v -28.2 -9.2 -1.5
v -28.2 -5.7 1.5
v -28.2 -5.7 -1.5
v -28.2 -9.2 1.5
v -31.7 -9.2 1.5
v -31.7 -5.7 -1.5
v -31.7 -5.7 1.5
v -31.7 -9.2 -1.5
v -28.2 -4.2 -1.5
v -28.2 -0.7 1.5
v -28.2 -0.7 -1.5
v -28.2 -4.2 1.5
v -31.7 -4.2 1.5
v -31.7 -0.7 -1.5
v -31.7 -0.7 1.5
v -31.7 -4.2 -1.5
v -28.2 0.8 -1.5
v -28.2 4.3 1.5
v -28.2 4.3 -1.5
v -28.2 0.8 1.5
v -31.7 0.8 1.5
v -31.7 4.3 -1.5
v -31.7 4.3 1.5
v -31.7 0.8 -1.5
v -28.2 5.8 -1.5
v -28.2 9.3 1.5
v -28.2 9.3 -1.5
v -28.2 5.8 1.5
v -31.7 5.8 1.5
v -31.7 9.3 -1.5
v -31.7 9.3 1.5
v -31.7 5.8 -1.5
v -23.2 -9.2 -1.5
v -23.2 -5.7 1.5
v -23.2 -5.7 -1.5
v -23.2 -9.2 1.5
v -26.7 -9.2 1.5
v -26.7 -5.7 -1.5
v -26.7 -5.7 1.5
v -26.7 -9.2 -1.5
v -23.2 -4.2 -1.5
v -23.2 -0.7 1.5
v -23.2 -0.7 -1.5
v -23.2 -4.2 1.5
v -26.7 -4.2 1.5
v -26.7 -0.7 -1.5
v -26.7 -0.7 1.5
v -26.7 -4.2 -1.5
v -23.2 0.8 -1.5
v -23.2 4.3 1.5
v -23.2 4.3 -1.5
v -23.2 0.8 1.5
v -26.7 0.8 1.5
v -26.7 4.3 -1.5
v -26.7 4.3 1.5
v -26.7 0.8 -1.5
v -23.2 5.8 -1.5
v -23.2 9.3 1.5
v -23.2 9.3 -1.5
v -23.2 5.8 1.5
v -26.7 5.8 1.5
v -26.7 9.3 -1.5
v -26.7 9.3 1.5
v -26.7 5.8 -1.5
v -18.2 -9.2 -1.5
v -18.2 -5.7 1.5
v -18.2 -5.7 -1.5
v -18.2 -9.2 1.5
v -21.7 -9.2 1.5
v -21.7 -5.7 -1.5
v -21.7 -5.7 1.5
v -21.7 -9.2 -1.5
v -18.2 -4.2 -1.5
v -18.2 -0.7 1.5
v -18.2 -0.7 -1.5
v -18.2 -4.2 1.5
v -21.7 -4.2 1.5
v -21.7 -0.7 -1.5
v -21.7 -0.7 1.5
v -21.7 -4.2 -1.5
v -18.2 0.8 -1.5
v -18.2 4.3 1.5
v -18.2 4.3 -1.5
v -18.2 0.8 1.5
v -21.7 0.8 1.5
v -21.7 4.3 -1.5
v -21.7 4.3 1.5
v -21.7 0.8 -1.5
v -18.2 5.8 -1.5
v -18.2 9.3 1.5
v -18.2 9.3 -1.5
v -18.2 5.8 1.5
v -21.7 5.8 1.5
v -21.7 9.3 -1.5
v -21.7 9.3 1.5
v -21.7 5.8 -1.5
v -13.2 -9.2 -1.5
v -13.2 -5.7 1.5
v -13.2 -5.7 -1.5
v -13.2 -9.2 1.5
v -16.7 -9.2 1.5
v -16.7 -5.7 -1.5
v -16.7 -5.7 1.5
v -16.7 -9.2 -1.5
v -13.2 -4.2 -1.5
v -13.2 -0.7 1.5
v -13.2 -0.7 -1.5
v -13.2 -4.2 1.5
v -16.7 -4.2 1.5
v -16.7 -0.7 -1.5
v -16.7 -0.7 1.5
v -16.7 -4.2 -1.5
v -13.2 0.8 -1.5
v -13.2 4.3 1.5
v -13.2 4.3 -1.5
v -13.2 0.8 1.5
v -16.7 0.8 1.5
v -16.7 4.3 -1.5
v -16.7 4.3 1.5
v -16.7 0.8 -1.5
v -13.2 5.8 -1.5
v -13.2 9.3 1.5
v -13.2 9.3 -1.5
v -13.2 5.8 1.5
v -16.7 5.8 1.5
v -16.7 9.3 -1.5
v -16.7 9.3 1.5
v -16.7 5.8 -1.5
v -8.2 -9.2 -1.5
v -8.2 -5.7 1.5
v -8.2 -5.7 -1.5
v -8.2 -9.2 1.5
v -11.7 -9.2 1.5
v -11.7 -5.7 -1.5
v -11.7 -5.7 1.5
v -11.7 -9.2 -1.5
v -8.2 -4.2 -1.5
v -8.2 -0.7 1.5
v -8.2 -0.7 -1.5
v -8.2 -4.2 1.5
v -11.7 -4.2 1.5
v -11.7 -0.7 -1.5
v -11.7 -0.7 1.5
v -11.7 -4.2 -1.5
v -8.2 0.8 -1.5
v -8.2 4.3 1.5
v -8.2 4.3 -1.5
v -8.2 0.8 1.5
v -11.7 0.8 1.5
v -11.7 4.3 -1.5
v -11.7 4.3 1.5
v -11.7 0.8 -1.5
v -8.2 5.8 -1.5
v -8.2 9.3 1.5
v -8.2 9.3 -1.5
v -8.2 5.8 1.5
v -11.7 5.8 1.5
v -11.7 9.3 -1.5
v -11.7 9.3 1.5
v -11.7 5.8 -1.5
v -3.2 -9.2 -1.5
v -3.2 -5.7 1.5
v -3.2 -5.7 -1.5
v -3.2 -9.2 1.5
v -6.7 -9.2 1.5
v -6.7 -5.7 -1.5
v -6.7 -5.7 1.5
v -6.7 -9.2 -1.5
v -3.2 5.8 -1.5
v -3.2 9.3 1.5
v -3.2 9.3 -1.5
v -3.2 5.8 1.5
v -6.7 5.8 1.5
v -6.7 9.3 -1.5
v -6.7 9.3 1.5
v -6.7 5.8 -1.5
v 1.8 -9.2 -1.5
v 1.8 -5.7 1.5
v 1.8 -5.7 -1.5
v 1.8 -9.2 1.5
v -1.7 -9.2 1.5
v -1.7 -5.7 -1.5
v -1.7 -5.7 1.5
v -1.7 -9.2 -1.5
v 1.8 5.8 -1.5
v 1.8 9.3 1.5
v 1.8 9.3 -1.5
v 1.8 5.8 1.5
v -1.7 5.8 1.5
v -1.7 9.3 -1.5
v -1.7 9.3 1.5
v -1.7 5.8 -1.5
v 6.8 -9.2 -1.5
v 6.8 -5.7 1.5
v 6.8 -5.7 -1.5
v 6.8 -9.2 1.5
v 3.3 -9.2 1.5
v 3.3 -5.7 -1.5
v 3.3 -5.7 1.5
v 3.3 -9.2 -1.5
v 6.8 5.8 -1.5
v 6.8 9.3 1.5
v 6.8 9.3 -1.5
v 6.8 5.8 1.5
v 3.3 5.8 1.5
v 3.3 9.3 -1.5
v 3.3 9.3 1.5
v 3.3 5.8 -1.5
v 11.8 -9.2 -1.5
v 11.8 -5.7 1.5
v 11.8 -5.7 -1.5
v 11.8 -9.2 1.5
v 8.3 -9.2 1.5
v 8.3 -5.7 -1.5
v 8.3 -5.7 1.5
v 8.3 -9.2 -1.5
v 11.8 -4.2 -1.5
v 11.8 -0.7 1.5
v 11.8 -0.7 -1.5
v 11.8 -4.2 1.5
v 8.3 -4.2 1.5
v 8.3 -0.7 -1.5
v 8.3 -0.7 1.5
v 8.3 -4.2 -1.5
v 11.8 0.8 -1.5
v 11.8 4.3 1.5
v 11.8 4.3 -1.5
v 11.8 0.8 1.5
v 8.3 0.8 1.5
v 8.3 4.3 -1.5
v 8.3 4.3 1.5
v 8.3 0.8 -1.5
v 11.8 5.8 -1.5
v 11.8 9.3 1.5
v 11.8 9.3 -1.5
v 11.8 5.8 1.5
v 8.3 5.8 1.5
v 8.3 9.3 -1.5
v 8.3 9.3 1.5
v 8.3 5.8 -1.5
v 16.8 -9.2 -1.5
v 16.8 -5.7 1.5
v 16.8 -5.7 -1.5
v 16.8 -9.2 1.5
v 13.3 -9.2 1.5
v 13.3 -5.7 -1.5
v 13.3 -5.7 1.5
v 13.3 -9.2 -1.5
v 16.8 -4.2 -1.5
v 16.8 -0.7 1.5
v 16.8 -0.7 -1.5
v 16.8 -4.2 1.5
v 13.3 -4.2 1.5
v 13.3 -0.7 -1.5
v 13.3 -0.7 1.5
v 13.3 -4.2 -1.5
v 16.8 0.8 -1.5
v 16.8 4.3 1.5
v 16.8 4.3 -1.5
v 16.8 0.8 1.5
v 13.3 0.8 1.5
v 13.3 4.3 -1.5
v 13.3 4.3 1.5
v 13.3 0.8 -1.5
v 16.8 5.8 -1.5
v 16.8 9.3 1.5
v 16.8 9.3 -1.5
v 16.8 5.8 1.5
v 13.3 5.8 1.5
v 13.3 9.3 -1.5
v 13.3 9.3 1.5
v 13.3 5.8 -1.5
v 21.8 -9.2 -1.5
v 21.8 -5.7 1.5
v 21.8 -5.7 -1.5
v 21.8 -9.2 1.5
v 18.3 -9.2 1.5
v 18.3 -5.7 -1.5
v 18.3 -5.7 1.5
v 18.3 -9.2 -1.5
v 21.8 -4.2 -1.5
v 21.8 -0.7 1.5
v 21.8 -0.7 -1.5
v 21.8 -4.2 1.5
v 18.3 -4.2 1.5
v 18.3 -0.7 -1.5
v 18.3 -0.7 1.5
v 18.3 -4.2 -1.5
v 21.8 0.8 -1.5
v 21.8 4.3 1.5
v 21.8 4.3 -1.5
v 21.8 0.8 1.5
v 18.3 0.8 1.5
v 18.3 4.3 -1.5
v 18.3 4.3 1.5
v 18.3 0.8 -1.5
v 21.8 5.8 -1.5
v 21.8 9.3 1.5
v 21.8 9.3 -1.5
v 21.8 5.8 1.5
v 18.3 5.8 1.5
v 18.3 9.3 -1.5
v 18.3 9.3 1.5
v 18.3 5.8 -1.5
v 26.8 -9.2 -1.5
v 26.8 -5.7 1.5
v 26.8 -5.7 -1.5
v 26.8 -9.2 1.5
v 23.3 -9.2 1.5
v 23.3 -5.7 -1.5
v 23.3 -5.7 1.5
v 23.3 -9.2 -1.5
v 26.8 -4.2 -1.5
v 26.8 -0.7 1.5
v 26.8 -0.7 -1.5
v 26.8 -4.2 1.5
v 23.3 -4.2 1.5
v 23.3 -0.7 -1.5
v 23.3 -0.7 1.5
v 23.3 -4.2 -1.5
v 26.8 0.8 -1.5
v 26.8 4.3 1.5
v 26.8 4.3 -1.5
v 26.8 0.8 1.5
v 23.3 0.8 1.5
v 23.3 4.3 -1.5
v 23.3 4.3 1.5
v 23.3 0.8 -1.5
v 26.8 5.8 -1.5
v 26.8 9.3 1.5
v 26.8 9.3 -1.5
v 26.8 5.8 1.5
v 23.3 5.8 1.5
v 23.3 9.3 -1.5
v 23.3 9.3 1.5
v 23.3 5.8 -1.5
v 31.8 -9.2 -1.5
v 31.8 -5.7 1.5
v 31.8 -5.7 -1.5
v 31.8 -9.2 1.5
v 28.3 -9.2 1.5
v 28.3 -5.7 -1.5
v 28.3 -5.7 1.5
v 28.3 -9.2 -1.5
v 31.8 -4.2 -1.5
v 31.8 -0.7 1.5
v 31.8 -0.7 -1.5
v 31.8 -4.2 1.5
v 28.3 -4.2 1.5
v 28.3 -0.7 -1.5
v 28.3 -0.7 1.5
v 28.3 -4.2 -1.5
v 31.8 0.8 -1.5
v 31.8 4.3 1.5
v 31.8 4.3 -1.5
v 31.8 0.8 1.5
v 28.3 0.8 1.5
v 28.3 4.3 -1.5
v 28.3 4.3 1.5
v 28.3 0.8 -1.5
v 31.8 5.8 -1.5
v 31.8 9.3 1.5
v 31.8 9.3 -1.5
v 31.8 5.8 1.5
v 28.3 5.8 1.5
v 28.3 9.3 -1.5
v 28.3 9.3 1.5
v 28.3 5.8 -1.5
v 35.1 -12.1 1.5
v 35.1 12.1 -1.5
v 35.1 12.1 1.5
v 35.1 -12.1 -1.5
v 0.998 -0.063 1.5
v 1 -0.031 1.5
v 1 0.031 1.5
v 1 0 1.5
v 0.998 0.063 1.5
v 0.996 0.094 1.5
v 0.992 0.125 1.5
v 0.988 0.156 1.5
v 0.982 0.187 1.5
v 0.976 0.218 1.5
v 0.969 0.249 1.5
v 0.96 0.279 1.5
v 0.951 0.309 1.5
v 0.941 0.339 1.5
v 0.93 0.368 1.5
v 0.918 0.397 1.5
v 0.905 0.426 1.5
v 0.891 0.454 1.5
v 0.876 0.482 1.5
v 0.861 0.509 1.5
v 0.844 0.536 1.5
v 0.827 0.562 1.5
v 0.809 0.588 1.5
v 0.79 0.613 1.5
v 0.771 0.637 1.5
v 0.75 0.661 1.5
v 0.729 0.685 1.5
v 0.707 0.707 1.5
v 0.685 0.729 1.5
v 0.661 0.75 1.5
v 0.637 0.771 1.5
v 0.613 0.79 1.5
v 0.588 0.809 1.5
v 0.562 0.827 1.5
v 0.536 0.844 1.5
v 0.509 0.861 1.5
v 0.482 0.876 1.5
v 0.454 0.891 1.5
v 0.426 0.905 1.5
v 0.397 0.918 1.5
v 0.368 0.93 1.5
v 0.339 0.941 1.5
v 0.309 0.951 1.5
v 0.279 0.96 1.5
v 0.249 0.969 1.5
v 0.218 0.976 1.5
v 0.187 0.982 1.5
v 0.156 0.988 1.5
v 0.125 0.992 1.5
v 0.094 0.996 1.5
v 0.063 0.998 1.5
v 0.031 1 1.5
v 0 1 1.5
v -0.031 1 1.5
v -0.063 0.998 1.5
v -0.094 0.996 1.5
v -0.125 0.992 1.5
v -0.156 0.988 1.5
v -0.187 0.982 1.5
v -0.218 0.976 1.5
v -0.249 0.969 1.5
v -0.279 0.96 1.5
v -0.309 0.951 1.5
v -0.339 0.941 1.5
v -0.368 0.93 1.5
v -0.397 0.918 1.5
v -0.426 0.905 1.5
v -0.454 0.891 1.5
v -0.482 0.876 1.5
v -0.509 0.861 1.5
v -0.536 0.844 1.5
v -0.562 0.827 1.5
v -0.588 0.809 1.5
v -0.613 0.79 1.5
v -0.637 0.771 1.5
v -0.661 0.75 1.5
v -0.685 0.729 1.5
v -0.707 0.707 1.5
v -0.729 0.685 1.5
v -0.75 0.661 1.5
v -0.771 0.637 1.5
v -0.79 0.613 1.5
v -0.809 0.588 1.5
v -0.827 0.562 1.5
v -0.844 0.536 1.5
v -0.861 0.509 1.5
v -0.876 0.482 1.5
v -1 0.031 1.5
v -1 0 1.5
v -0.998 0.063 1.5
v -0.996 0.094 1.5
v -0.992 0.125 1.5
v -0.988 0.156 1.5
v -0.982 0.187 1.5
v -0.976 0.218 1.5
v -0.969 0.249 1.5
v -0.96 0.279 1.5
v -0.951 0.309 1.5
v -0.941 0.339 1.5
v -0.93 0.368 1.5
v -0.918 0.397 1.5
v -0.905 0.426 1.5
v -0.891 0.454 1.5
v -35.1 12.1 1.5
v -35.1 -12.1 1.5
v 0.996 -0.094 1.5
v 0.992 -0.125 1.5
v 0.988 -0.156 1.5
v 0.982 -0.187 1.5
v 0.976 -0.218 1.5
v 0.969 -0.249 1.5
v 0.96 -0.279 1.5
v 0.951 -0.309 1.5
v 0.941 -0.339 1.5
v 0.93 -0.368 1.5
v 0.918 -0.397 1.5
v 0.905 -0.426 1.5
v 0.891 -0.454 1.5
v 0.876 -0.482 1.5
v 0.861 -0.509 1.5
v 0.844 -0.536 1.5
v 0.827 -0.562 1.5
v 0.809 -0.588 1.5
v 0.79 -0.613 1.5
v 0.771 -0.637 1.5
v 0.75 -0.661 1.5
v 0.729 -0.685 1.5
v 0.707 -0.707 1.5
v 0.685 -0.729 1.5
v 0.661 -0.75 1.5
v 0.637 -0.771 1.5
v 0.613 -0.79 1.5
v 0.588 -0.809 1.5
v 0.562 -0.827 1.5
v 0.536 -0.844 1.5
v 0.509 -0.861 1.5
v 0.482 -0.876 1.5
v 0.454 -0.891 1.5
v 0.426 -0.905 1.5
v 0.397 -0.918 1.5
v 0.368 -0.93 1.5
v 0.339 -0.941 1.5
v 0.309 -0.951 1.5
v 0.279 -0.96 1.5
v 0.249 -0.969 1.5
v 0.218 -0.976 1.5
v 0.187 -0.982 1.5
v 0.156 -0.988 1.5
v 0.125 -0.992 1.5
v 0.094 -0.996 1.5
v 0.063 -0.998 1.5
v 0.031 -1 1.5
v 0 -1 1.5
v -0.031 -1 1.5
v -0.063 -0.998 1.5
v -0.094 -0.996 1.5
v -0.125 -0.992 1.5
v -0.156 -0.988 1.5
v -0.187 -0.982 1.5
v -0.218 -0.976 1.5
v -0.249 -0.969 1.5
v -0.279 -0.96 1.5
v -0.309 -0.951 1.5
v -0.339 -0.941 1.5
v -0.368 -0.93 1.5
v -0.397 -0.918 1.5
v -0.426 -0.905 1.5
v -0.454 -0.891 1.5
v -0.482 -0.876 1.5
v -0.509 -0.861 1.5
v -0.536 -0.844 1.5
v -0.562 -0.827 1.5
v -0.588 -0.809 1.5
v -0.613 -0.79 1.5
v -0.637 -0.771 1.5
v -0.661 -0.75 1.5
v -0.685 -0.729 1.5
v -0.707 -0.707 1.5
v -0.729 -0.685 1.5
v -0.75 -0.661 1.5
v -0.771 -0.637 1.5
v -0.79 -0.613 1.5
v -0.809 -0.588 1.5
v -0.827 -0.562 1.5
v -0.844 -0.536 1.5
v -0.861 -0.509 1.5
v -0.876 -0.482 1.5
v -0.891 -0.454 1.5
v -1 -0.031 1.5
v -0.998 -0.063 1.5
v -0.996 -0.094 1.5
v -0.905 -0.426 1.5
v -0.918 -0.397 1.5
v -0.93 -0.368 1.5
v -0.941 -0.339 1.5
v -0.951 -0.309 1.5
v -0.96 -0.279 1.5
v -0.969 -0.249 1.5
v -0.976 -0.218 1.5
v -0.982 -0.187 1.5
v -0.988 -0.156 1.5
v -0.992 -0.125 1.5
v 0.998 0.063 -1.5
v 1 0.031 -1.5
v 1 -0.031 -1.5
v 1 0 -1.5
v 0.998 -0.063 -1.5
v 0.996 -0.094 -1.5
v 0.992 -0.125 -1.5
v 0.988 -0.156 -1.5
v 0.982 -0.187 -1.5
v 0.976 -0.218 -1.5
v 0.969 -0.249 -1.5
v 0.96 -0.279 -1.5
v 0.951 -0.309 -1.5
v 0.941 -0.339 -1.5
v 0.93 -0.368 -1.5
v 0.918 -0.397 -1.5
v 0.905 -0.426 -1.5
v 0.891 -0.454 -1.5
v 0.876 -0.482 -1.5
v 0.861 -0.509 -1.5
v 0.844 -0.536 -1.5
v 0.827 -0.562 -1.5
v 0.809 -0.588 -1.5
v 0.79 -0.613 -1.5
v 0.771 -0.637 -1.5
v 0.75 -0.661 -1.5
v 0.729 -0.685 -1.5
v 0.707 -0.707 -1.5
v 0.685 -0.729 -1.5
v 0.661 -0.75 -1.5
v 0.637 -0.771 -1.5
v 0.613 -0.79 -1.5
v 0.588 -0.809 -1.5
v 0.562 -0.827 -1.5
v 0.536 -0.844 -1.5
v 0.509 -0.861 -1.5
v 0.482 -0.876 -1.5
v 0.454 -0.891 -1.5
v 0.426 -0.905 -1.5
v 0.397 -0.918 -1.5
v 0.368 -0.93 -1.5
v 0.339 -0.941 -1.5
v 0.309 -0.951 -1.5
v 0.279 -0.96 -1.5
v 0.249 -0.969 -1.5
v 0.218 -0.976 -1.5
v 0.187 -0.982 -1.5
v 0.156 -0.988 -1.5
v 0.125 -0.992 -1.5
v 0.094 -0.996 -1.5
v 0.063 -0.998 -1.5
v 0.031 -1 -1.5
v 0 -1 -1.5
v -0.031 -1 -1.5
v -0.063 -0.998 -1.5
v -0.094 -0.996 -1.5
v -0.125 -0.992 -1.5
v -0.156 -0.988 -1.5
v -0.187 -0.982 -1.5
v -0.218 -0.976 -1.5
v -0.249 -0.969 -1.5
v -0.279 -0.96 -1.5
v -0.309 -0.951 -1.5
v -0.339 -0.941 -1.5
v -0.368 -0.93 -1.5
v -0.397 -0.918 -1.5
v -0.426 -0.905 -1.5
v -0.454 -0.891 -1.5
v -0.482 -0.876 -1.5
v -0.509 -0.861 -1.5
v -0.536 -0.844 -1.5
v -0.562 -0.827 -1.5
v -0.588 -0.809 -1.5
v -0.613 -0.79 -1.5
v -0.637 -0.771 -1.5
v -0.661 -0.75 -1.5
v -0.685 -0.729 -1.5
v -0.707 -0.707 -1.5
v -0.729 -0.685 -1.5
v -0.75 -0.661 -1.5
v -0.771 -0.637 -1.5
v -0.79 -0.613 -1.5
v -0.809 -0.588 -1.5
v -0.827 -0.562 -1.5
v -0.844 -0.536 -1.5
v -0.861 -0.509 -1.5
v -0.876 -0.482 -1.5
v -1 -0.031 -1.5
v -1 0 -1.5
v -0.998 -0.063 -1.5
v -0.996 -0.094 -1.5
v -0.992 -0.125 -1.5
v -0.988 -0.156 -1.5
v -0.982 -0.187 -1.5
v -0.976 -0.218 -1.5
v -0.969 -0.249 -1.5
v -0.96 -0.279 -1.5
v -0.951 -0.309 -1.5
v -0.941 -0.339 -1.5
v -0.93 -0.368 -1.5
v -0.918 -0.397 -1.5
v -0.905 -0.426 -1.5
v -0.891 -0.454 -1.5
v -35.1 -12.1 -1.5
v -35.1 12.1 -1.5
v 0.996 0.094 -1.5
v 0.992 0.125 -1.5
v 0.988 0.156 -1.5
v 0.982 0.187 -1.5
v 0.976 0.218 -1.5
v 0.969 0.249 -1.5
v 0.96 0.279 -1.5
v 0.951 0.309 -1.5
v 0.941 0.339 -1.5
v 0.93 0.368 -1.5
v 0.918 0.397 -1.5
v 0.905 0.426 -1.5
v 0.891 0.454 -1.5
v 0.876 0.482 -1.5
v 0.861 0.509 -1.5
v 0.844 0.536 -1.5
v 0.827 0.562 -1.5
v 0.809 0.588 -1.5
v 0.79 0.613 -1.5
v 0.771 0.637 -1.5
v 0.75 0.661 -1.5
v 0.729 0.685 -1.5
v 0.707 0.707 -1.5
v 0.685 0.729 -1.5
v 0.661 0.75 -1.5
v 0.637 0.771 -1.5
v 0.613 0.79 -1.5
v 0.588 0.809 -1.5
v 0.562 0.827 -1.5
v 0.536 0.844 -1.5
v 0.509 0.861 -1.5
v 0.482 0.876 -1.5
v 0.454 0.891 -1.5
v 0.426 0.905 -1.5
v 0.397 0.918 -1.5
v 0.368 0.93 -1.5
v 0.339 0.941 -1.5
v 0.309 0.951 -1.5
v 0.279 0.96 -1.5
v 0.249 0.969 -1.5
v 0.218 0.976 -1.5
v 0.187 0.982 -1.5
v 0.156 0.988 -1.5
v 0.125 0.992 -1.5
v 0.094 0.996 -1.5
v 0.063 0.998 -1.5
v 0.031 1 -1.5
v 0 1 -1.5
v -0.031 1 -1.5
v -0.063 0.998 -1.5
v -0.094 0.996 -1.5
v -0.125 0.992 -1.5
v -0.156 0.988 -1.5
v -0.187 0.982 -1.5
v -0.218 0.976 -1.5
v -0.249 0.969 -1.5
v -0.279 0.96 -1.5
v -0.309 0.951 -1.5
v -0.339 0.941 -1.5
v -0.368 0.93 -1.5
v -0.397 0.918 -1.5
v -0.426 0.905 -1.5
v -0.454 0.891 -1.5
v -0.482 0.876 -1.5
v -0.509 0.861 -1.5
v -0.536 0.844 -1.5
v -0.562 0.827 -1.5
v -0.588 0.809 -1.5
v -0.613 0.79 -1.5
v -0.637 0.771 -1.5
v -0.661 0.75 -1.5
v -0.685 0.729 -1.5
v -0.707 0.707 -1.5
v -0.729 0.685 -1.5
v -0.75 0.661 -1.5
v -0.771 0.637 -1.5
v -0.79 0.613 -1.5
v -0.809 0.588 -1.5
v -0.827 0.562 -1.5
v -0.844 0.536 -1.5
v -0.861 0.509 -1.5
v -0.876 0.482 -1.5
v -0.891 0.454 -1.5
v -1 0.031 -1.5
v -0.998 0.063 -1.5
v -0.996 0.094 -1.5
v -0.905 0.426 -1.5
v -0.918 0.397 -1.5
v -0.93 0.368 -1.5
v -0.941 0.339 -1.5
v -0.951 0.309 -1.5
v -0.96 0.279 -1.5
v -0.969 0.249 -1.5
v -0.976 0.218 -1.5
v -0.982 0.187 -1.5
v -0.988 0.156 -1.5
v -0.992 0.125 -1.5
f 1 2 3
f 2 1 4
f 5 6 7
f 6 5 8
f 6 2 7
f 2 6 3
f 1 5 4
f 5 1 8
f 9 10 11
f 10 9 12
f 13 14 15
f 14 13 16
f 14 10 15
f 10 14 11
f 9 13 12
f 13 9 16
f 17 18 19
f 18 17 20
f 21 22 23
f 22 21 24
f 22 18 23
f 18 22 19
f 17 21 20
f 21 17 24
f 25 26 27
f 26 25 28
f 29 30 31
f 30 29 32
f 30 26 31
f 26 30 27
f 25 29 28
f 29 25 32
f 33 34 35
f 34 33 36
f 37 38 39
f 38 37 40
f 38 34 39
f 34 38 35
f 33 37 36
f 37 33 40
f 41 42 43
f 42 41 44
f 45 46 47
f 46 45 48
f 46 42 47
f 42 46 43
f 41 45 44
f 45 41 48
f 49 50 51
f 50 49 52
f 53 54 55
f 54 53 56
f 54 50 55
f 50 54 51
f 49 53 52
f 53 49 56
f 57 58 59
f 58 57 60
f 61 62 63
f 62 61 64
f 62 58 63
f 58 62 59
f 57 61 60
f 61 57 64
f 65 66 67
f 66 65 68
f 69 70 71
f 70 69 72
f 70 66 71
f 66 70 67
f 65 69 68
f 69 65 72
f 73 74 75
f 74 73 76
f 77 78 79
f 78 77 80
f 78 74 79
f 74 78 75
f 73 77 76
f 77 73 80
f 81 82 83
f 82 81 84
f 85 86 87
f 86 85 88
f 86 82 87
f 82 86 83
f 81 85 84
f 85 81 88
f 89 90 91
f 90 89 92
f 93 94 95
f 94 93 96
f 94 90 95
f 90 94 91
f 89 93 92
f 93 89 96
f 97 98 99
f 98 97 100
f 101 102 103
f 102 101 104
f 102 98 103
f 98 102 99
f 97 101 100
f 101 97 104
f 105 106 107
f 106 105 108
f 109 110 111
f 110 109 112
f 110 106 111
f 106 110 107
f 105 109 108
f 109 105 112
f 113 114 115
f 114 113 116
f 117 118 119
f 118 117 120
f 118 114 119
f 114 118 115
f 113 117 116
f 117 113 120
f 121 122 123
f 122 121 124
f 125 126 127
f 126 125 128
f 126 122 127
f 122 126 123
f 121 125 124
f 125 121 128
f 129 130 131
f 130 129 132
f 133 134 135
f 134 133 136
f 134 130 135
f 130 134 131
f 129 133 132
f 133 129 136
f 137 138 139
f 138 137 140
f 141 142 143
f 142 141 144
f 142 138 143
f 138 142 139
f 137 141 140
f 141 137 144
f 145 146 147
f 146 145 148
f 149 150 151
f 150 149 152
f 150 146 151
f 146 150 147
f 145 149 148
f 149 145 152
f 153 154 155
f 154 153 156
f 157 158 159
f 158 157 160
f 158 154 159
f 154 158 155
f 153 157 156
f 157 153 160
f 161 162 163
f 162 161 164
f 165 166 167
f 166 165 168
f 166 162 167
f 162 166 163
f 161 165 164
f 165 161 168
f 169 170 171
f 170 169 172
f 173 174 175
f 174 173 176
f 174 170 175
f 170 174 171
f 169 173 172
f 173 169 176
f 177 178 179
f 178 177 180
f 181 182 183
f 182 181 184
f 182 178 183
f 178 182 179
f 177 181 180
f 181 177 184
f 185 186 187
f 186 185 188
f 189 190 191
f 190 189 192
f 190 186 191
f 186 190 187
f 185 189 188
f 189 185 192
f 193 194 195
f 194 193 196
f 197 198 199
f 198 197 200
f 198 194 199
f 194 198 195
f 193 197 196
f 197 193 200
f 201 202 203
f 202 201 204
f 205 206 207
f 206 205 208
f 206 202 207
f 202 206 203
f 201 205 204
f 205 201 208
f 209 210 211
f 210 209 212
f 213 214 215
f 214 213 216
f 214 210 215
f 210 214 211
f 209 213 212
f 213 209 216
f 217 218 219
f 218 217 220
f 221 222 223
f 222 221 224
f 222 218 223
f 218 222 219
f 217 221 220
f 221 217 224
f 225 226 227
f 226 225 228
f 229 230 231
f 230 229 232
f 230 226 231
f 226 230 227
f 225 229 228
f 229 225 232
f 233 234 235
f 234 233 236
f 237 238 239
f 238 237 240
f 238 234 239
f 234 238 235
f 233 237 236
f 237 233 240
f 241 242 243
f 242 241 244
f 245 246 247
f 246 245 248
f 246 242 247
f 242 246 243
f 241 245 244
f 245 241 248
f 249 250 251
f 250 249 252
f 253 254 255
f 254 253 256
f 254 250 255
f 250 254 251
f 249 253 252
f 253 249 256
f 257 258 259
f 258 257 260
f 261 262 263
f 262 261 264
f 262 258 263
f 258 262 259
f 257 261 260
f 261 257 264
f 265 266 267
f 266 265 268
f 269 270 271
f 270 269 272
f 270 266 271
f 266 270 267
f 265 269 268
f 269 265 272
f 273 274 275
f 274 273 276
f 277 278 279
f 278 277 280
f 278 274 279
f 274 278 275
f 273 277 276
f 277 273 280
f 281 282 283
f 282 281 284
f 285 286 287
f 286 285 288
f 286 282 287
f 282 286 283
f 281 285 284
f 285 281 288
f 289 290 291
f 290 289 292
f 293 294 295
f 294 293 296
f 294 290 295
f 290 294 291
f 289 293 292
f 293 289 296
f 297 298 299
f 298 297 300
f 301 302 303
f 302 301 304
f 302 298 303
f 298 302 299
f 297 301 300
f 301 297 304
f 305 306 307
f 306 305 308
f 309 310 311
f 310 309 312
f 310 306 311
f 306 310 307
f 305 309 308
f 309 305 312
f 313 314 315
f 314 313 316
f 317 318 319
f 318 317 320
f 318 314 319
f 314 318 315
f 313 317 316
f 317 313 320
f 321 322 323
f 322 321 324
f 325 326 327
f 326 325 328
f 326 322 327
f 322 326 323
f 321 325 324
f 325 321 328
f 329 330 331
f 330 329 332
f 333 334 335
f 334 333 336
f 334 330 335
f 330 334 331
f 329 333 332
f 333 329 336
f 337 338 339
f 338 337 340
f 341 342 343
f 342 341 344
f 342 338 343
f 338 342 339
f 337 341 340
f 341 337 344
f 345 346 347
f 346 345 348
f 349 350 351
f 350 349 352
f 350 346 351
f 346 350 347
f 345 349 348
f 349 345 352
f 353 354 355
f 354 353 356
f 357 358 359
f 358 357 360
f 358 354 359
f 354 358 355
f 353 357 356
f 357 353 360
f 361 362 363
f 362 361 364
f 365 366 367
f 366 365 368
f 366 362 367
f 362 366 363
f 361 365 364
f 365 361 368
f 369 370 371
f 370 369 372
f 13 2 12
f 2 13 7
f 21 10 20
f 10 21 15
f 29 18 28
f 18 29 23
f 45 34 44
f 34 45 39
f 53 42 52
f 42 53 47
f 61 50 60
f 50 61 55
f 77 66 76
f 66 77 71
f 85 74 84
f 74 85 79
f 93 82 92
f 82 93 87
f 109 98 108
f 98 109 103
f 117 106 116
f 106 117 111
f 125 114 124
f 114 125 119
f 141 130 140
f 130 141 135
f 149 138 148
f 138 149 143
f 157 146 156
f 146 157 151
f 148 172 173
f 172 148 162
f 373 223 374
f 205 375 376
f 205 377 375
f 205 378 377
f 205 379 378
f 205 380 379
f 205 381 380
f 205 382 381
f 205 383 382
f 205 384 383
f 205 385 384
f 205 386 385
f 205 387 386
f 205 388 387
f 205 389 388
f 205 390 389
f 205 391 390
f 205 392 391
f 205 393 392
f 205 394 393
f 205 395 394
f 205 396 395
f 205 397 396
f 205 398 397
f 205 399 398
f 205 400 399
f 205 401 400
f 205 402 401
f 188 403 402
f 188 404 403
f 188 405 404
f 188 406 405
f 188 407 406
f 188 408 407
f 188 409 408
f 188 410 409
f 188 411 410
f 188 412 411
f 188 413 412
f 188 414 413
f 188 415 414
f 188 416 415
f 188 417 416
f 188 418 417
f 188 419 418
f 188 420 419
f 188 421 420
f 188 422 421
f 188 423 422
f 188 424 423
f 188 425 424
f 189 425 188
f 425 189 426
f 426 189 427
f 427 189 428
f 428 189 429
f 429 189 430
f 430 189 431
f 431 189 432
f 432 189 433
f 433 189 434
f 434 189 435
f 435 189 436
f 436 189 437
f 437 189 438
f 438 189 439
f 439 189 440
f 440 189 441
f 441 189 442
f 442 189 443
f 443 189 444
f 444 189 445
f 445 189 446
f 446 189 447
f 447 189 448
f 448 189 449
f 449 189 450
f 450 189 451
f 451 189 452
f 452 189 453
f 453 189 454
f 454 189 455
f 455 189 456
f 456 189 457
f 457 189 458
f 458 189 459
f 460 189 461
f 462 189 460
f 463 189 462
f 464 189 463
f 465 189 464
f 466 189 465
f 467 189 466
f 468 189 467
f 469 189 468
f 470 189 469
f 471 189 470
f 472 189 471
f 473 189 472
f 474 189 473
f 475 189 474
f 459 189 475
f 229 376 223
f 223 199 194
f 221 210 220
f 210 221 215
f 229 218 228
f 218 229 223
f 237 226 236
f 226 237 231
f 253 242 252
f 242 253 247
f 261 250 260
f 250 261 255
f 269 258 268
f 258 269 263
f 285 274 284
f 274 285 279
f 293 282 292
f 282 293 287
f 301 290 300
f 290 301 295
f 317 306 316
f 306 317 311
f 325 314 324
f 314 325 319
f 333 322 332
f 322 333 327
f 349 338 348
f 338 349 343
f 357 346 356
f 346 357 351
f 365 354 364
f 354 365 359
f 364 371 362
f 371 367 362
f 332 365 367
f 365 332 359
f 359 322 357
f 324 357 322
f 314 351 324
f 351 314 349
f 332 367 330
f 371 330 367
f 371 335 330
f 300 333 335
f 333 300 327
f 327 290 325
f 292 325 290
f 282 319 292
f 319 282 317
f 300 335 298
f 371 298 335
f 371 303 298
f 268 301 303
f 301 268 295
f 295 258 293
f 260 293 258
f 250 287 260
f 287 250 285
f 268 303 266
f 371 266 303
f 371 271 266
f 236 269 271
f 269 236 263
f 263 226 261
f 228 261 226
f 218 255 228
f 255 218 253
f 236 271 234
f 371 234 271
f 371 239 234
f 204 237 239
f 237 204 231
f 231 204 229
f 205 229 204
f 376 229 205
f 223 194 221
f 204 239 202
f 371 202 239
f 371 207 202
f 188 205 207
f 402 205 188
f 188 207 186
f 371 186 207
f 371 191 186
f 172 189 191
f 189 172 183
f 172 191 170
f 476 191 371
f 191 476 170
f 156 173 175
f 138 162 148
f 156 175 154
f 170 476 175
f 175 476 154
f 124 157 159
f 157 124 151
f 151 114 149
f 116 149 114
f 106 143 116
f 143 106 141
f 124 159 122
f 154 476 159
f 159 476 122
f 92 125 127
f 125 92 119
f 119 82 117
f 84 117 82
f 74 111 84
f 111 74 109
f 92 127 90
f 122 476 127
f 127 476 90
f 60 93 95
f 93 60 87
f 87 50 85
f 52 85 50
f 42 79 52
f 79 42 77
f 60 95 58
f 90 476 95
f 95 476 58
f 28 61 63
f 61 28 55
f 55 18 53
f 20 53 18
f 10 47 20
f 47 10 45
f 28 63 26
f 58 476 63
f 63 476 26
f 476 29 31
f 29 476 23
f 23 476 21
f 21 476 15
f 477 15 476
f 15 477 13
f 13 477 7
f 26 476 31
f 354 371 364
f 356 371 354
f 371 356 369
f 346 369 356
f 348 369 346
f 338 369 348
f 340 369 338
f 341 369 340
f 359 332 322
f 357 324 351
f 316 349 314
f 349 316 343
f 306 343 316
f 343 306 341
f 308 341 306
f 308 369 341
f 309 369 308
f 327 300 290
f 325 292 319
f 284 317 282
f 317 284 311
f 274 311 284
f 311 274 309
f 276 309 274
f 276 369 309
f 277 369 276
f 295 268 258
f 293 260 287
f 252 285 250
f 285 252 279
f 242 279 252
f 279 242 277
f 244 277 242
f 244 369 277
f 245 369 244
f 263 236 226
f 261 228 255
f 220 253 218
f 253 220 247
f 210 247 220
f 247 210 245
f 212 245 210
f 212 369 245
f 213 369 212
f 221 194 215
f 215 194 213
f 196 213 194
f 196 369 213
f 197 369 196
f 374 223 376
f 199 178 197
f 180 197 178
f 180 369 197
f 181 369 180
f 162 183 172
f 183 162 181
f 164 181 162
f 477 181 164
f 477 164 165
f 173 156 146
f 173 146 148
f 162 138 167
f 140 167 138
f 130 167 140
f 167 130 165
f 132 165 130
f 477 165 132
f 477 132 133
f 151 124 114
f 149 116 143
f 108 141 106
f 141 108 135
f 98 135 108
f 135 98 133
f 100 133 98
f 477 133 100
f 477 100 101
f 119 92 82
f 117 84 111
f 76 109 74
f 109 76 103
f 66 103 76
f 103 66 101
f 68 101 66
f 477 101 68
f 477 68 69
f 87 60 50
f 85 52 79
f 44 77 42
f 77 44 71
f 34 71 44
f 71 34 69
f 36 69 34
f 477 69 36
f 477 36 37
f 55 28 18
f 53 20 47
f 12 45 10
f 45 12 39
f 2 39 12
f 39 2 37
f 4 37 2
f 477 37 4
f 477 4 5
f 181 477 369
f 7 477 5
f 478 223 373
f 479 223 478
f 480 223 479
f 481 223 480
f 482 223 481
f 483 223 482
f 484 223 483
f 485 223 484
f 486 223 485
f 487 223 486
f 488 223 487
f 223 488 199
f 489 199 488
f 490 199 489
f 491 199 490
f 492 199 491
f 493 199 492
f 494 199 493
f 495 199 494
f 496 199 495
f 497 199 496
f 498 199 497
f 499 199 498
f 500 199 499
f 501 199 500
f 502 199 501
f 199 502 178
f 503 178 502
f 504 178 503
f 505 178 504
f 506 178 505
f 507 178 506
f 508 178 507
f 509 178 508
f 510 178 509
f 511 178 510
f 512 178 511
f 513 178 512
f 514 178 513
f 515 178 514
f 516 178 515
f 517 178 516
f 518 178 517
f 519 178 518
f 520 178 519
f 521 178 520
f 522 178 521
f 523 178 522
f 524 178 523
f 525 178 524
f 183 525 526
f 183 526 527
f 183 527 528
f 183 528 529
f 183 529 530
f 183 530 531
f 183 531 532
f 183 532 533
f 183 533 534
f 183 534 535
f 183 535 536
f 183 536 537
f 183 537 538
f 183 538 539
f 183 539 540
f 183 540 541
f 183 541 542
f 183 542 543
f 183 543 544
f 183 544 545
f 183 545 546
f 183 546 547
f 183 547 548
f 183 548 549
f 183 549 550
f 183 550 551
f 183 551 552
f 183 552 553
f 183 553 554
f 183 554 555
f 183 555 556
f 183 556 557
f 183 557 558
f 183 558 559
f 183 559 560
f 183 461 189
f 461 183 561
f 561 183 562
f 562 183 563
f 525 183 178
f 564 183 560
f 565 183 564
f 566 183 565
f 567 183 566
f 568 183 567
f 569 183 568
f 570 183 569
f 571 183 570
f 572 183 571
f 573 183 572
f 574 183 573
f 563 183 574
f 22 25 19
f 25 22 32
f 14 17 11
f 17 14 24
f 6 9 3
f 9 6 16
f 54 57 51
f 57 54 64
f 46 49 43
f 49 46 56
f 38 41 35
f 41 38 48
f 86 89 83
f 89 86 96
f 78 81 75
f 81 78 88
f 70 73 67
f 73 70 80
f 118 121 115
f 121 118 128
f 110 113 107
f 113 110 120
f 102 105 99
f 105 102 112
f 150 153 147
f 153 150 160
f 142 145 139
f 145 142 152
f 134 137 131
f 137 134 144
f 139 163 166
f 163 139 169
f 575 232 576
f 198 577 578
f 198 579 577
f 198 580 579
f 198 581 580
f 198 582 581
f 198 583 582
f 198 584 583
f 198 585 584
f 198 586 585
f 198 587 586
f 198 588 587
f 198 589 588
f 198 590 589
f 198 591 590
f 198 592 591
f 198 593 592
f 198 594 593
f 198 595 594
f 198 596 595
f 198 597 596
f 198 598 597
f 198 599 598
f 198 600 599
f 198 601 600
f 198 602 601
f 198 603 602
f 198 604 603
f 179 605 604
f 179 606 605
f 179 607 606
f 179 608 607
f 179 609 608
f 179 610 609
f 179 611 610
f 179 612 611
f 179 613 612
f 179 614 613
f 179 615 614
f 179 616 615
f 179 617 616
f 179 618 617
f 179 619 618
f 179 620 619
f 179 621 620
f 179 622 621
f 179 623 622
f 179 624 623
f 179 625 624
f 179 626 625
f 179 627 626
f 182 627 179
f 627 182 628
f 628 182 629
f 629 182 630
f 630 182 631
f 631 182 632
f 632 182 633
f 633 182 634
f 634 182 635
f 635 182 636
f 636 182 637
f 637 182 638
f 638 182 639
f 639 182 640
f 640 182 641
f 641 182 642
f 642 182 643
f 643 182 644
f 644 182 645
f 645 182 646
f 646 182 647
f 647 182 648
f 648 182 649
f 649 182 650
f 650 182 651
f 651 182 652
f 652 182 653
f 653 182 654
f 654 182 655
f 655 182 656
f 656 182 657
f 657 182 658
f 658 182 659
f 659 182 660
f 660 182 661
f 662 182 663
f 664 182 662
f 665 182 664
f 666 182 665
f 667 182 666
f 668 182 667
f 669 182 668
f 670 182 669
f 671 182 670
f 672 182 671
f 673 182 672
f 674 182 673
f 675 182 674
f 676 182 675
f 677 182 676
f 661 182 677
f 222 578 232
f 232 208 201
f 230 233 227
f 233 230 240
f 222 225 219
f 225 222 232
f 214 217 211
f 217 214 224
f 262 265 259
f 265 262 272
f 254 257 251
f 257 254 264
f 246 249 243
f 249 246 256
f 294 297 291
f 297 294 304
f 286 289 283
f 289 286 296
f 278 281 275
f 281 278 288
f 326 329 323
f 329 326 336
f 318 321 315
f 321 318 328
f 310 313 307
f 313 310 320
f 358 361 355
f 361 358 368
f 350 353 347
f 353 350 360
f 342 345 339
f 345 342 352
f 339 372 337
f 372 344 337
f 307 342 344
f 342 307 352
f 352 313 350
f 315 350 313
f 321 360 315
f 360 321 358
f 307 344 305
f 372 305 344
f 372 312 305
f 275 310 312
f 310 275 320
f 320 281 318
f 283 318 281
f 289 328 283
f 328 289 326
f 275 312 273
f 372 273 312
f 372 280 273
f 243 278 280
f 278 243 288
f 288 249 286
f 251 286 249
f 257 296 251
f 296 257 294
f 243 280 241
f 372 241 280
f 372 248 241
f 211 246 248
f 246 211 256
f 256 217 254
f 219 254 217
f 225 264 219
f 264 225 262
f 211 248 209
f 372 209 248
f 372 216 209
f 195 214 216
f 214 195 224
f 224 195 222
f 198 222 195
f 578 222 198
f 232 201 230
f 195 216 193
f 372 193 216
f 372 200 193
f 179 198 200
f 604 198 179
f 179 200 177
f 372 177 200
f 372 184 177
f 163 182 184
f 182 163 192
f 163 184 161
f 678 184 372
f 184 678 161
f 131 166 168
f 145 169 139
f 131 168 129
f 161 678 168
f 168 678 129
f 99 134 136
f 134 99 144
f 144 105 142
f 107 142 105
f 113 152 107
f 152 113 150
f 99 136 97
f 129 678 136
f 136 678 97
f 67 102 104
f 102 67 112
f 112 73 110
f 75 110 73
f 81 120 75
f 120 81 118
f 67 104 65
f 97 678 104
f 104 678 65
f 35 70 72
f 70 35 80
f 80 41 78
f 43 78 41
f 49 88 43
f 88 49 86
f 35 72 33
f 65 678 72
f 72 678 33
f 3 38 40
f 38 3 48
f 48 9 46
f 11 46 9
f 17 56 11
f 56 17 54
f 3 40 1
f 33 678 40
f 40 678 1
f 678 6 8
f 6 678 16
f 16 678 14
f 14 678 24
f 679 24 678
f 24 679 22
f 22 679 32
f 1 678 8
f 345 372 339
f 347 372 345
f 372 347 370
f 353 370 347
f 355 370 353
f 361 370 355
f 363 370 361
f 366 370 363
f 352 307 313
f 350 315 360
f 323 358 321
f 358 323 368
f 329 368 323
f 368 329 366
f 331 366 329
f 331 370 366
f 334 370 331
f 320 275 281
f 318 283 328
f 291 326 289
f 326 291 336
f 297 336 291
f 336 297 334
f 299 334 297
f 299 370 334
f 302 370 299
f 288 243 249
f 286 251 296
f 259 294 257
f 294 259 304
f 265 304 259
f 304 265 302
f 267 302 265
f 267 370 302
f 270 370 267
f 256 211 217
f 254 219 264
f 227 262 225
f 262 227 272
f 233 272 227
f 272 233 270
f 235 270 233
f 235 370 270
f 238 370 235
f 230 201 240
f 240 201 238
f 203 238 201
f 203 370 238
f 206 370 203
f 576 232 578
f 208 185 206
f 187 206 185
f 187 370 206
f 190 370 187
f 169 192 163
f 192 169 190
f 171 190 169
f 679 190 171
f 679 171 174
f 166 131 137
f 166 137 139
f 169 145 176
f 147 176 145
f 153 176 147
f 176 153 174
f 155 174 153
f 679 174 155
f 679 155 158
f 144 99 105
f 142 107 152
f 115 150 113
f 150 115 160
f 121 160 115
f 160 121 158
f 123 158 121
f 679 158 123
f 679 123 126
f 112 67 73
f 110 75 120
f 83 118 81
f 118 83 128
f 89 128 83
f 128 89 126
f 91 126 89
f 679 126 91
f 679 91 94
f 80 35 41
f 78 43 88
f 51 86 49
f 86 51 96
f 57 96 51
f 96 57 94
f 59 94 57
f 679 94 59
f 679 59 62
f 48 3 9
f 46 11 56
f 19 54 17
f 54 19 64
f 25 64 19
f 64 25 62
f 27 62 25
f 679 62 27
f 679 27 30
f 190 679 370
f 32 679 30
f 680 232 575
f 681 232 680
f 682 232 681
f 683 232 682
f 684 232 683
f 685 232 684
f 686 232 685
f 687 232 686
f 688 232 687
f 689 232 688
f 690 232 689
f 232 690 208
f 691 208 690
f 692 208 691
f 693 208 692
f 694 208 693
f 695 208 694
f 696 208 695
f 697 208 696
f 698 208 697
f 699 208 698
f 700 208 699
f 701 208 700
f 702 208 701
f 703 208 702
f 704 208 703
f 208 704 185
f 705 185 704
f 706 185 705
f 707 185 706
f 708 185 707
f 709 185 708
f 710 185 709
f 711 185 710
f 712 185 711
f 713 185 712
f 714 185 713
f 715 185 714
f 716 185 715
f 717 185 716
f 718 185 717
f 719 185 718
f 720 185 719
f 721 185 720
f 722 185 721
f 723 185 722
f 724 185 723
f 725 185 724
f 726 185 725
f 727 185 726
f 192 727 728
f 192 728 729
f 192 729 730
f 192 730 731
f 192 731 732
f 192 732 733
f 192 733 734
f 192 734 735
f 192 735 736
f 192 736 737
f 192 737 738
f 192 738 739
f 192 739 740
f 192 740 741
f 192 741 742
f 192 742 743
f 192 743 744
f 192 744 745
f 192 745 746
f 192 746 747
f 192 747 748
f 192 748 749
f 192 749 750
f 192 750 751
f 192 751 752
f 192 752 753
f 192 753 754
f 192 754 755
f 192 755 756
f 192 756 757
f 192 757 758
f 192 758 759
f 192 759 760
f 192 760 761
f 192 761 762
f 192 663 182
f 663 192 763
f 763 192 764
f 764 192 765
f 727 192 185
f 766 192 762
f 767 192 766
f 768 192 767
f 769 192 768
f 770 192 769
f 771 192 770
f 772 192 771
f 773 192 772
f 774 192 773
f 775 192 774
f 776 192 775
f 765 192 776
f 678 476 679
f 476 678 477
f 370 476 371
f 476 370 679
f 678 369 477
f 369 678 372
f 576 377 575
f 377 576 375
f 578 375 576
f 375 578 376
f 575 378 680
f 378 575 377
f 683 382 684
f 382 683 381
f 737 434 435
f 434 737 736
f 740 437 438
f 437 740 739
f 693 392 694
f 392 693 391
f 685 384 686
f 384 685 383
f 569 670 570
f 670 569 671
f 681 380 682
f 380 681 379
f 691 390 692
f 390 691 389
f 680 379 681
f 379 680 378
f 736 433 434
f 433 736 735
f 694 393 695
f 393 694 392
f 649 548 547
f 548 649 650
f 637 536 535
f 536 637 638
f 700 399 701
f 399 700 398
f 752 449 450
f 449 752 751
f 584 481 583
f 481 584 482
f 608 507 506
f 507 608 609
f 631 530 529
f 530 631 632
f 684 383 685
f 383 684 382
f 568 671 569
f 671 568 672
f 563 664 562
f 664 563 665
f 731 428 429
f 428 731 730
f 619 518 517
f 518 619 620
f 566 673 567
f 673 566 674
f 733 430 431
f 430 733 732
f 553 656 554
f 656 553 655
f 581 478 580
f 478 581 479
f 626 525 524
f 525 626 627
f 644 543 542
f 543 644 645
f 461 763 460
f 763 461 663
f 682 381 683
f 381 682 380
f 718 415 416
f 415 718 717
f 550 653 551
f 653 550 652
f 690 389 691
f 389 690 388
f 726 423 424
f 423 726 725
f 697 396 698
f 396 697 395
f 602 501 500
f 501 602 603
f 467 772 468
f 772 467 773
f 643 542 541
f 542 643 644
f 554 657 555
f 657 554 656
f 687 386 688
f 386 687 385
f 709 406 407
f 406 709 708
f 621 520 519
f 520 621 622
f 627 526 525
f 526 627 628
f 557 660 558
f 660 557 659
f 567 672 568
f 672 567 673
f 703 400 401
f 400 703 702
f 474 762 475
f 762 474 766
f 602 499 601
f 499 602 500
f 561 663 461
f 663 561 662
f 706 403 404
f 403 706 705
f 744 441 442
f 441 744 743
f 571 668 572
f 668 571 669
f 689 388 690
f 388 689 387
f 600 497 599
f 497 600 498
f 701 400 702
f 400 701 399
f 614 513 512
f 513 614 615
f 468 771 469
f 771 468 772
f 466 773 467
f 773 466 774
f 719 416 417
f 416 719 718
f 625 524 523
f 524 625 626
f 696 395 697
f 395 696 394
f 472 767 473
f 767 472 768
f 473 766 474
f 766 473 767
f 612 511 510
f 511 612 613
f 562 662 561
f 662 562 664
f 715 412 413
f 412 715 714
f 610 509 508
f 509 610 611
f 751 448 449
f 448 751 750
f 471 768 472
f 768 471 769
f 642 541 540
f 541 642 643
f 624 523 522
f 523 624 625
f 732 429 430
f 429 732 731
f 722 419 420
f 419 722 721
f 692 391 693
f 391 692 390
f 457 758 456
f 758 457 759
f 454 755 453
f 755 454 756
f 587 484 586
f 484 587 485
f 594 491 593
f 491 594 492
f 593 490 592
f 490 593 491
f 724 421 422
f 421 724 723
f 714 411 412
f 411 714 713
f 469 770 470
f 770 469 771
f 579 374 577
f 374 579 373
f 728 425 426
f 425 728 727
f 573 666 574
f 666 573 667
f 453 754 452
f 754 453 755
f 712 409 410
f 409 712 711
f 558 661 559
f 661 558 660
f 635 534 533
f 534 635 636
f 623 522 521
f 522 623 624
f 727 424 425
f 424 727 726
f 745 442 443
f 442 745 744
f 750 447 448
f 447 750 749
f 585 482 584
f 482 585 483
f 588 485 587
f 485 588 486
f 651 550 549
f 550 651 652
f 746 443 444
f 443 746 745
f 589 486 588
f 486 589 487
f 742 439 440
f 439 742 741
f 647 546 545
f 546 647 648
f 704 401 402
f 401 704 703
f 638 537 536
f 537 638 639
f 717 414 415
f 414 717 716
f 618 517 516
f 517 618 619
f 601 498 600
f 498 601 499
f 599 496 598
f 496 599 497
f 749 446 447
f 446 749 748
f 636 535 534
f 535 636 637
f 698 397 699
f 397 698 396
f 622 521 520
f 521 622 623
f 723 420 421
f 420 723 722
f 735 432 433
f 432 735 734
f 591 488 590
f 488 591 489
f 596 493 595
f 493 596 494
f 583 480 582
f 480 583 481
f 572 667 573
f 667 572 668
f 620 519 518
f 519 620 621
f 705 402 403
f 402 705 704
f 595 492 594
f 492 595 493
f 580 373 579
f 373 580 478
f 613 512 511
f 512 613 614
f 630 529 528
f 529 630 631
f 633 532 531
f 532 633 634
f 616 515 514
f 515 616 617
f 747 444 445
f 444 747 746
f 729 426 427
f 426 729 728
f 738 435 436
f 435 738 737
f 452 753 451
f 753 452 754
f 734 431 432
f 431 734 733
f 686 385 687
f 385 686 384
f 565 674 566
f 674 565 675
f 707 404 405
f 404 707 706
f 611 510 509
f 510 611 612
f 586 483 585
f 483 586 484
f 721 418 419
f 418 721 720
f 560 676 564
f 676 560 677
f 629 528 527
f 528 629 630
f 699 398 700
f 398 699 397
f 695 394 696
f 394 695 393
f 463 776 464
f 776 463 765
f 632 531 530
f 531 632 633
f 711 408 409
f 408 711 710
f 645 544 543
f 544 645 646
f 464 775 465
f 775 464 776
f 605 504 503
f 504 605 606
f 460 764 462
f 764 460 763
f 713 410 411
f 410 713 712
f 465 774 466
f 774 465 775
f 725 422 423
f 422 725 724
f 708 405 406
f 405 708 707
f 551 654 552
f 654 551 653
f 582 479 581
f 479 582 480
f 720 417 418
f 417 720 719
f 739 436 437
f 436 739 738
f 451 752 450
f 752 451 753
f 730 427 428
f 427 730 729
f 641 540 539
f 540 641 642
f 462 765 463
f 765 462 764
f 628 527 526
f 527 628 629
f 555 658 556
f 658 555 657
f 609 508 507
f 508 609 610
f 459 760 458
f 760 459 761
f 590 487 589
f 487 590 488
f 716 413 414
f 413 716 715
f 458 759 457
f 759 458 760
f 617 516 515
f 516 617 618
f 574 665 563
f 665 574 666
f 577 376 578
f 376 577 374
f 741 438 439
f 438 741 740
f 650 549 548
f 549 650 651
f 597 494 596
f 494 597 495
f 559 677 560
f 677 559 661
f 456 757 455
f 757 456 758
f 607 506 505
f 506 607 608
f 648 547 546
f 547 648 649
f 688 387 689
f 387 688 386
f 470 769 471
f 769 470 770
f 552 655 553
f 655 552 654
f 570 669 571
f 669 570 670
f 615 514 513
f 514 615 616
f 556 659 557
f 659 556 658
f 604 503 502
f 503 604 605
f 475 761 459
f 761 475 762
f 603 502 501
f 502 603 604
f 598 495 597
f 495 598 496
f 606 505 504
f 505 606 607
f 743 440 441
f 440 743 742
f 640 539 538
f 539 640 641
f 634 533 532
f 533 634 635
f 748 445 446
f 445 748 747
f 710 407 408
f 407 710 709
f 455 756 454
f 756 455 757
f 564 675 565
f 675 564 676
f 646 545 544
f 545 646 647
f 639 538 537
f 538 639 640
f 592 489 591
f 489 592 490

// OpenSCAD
// Guide bush formula
// https://trend-storage.online/productdocuments/dl_gb-offset-formula.pdf

$fn = 200;

FRICTION_OFFSET = 0.3;

ROUTER_BIT_DIAMETER = 8;
ROUTER_GUIDE_BUSH_DIAMETER = 16.9;
ROUTER_TEMPLATE_GUIDE_HEIGHT =
    8 + 1;  // Extra 1mm so guide bush doesn't touch the wood

BRACKET_WIDTH = 61;
BRACKET_DEPTH = 15;

PLANK_THICKNESS = 19;
PLANK_WIDTH = 134;
PLANK_NOTCH_WIDTH = PLANK_THICKNESS + FRICTION_OFFSET;
NOTCH_DEPTH = 15;

router_bush_offset = ROUTER_GUIDE_BUSH_DIAMETER - ROUTER_BIT_DIAMETER;
guide_height = ROUTER_TEMPLATE_GUIDE_HEIGHT + 5;

bracket_template_width = BRACKET_WIDTH + router_bush_offset;
bracket_template_depth = BRACKET_DEPTH + router_bush_offset;

jig_width = bracket_template_width + 50;
jig_depth = bracket_template_depth + 25;
jig_height = ROUTER_TEMPLATE_GUIDE_HEIGHT + NOTCH_DEPTH;
jig_side_width = (jig_depth / 2) - (PLANK_NOTCH_WIDTH / 2);

CLAMP_PLATE_HEIGHT = PLANK_WIDTH - NOTCH_DEPTH;
CLAMP_PLATE_THICKNESS = 4;

module clamp_pin() { cylinder(r = 3, h = 20, center = true); }

module clamp_pins() {
  // Cut out three 8mm radius cyclinders with 1cm height to hold the clamp
  // plate to the jig
  pins_width = jig_width - jig_side_width;

  translate([ jig_width / -2, jig_depth / -2, jig_height / -2 ]) {
    translate([ 0, jig_side_width / 2, 0 ]) {
      for (x = [0:pins_width / 4:pins_width]) {
        translate([ jig_side_width / 2 + x, 0, 0 ]) { clamp_pin(); }
      }
    }
  }
}

module clamp_plate(z_offset = 0) {
  translate([ 0, 0, z_offset ]) {
    difference() {
      union() {
        color([ 0, 1, 0 ]) {
          translate([
            jig_width / -2,
            jig_depth / -2 - CLAMP_PLATE_THICKNESS + jig_side_width,
            (CLAMP_PLATE_HEIGHT +
             (ROUTER_TEMPLATE_GUIDE_HEIGHT + NOTCH_DEPTH) / 2) *
                -1
          ]) {
            color([ 0, 1, 0 ]) {
              cube([ jig_width, CLAMP_PLATE_THICKNESS, CLAMP_PLATE_HEIGHT ]);
            }
          }

          translate([ jig_width / 2, PLANK_NOTCH_WIDTH / -2, jig_height / -2 ])
              rotate([ 0, 90, 180 ]) linear_extrude(height = jig_width) {
            // draw triangle on side of clamp plate next to jig
            polygon(points = [
              [ 0, 0 ],
              [ 0, jig_side_width ],
              [ 10, jig_side_width ],
              [ 10 + jig_side_width, 0 ],
              [ 10, 0 ],
            ]);
          }
        }
      }
      clamp_pins();
    }
  }
}

module jig() {
  difference() {
    cube([ jig_width, jig_depth, jig_height ], true);

    cube(
        [
          bracket_template_width + FRICTION_OFFSET,
          bracket_template_depth + FRICTION_OFFSET, NOTCH_DEPTH + guide_height +
          FRICTION_OFFSET
        ],
        true);

    // Remove 1mm deep thin lines on X and Y axis to center the jig
    translate([ 0, 0, (ROUTER_TEMPLATE_GUIDE_HEIGHT + NOTCH_DEPTH) / 2 ]) {
      cube([ jig_width + 1, 1, 2 ], true);
      cube([ 1, jig_depth + 1, 2 ], true);
    }

    // Notch for it to sit flat on the side of the wood.
    translate([ 0, 0, ROUTER_TEMPLATE_GUIDE_HEIGHT / -2 - 1 ]) {
      cube([ jig_width + 5, PLANK_NOTCH_WIDTH, NOTCH_DEPTH + 1 ], true);
    }

    clamp_pins();
  }
}

// This part is for a center punch to mark the center of the hole for
// drilling.
module center_punch_plate() {
  center_punch_card_height = 3;
  difference() {
    union() {
      difference() {
        cube(
            [
              bracket_template_width + FRICTION_OFFSET,
              bracket_template_depth + FRICTION_OFFSET,
              center_punch_card_height
            ],
            true);

        // Cut out grid pattern to save filament
        grid_spacing = 5;
        for (x = [grid_spacing:grid_spacing:bracket_template_width]) {
          for (y = [grid_spacing:grid_spacing:bracket_template_depth]) {
            translate([
              x - (bracket_template_width) / 2,
              y - (bracket_template_depth) / 2 - 0.5, 0
            ]) {
              cube([ 3.5, 3.5, center_punch_card_height * 2 ], true);
            }
          }
        }
      }

      cube([ 14, 10, center_punch_card_height ], true);
    }
    cylinder(r = 1, h = 20, center = true);
  }
}

// jig();
// clamp_plate();
// clamp_pin();
center_punch_plate();
